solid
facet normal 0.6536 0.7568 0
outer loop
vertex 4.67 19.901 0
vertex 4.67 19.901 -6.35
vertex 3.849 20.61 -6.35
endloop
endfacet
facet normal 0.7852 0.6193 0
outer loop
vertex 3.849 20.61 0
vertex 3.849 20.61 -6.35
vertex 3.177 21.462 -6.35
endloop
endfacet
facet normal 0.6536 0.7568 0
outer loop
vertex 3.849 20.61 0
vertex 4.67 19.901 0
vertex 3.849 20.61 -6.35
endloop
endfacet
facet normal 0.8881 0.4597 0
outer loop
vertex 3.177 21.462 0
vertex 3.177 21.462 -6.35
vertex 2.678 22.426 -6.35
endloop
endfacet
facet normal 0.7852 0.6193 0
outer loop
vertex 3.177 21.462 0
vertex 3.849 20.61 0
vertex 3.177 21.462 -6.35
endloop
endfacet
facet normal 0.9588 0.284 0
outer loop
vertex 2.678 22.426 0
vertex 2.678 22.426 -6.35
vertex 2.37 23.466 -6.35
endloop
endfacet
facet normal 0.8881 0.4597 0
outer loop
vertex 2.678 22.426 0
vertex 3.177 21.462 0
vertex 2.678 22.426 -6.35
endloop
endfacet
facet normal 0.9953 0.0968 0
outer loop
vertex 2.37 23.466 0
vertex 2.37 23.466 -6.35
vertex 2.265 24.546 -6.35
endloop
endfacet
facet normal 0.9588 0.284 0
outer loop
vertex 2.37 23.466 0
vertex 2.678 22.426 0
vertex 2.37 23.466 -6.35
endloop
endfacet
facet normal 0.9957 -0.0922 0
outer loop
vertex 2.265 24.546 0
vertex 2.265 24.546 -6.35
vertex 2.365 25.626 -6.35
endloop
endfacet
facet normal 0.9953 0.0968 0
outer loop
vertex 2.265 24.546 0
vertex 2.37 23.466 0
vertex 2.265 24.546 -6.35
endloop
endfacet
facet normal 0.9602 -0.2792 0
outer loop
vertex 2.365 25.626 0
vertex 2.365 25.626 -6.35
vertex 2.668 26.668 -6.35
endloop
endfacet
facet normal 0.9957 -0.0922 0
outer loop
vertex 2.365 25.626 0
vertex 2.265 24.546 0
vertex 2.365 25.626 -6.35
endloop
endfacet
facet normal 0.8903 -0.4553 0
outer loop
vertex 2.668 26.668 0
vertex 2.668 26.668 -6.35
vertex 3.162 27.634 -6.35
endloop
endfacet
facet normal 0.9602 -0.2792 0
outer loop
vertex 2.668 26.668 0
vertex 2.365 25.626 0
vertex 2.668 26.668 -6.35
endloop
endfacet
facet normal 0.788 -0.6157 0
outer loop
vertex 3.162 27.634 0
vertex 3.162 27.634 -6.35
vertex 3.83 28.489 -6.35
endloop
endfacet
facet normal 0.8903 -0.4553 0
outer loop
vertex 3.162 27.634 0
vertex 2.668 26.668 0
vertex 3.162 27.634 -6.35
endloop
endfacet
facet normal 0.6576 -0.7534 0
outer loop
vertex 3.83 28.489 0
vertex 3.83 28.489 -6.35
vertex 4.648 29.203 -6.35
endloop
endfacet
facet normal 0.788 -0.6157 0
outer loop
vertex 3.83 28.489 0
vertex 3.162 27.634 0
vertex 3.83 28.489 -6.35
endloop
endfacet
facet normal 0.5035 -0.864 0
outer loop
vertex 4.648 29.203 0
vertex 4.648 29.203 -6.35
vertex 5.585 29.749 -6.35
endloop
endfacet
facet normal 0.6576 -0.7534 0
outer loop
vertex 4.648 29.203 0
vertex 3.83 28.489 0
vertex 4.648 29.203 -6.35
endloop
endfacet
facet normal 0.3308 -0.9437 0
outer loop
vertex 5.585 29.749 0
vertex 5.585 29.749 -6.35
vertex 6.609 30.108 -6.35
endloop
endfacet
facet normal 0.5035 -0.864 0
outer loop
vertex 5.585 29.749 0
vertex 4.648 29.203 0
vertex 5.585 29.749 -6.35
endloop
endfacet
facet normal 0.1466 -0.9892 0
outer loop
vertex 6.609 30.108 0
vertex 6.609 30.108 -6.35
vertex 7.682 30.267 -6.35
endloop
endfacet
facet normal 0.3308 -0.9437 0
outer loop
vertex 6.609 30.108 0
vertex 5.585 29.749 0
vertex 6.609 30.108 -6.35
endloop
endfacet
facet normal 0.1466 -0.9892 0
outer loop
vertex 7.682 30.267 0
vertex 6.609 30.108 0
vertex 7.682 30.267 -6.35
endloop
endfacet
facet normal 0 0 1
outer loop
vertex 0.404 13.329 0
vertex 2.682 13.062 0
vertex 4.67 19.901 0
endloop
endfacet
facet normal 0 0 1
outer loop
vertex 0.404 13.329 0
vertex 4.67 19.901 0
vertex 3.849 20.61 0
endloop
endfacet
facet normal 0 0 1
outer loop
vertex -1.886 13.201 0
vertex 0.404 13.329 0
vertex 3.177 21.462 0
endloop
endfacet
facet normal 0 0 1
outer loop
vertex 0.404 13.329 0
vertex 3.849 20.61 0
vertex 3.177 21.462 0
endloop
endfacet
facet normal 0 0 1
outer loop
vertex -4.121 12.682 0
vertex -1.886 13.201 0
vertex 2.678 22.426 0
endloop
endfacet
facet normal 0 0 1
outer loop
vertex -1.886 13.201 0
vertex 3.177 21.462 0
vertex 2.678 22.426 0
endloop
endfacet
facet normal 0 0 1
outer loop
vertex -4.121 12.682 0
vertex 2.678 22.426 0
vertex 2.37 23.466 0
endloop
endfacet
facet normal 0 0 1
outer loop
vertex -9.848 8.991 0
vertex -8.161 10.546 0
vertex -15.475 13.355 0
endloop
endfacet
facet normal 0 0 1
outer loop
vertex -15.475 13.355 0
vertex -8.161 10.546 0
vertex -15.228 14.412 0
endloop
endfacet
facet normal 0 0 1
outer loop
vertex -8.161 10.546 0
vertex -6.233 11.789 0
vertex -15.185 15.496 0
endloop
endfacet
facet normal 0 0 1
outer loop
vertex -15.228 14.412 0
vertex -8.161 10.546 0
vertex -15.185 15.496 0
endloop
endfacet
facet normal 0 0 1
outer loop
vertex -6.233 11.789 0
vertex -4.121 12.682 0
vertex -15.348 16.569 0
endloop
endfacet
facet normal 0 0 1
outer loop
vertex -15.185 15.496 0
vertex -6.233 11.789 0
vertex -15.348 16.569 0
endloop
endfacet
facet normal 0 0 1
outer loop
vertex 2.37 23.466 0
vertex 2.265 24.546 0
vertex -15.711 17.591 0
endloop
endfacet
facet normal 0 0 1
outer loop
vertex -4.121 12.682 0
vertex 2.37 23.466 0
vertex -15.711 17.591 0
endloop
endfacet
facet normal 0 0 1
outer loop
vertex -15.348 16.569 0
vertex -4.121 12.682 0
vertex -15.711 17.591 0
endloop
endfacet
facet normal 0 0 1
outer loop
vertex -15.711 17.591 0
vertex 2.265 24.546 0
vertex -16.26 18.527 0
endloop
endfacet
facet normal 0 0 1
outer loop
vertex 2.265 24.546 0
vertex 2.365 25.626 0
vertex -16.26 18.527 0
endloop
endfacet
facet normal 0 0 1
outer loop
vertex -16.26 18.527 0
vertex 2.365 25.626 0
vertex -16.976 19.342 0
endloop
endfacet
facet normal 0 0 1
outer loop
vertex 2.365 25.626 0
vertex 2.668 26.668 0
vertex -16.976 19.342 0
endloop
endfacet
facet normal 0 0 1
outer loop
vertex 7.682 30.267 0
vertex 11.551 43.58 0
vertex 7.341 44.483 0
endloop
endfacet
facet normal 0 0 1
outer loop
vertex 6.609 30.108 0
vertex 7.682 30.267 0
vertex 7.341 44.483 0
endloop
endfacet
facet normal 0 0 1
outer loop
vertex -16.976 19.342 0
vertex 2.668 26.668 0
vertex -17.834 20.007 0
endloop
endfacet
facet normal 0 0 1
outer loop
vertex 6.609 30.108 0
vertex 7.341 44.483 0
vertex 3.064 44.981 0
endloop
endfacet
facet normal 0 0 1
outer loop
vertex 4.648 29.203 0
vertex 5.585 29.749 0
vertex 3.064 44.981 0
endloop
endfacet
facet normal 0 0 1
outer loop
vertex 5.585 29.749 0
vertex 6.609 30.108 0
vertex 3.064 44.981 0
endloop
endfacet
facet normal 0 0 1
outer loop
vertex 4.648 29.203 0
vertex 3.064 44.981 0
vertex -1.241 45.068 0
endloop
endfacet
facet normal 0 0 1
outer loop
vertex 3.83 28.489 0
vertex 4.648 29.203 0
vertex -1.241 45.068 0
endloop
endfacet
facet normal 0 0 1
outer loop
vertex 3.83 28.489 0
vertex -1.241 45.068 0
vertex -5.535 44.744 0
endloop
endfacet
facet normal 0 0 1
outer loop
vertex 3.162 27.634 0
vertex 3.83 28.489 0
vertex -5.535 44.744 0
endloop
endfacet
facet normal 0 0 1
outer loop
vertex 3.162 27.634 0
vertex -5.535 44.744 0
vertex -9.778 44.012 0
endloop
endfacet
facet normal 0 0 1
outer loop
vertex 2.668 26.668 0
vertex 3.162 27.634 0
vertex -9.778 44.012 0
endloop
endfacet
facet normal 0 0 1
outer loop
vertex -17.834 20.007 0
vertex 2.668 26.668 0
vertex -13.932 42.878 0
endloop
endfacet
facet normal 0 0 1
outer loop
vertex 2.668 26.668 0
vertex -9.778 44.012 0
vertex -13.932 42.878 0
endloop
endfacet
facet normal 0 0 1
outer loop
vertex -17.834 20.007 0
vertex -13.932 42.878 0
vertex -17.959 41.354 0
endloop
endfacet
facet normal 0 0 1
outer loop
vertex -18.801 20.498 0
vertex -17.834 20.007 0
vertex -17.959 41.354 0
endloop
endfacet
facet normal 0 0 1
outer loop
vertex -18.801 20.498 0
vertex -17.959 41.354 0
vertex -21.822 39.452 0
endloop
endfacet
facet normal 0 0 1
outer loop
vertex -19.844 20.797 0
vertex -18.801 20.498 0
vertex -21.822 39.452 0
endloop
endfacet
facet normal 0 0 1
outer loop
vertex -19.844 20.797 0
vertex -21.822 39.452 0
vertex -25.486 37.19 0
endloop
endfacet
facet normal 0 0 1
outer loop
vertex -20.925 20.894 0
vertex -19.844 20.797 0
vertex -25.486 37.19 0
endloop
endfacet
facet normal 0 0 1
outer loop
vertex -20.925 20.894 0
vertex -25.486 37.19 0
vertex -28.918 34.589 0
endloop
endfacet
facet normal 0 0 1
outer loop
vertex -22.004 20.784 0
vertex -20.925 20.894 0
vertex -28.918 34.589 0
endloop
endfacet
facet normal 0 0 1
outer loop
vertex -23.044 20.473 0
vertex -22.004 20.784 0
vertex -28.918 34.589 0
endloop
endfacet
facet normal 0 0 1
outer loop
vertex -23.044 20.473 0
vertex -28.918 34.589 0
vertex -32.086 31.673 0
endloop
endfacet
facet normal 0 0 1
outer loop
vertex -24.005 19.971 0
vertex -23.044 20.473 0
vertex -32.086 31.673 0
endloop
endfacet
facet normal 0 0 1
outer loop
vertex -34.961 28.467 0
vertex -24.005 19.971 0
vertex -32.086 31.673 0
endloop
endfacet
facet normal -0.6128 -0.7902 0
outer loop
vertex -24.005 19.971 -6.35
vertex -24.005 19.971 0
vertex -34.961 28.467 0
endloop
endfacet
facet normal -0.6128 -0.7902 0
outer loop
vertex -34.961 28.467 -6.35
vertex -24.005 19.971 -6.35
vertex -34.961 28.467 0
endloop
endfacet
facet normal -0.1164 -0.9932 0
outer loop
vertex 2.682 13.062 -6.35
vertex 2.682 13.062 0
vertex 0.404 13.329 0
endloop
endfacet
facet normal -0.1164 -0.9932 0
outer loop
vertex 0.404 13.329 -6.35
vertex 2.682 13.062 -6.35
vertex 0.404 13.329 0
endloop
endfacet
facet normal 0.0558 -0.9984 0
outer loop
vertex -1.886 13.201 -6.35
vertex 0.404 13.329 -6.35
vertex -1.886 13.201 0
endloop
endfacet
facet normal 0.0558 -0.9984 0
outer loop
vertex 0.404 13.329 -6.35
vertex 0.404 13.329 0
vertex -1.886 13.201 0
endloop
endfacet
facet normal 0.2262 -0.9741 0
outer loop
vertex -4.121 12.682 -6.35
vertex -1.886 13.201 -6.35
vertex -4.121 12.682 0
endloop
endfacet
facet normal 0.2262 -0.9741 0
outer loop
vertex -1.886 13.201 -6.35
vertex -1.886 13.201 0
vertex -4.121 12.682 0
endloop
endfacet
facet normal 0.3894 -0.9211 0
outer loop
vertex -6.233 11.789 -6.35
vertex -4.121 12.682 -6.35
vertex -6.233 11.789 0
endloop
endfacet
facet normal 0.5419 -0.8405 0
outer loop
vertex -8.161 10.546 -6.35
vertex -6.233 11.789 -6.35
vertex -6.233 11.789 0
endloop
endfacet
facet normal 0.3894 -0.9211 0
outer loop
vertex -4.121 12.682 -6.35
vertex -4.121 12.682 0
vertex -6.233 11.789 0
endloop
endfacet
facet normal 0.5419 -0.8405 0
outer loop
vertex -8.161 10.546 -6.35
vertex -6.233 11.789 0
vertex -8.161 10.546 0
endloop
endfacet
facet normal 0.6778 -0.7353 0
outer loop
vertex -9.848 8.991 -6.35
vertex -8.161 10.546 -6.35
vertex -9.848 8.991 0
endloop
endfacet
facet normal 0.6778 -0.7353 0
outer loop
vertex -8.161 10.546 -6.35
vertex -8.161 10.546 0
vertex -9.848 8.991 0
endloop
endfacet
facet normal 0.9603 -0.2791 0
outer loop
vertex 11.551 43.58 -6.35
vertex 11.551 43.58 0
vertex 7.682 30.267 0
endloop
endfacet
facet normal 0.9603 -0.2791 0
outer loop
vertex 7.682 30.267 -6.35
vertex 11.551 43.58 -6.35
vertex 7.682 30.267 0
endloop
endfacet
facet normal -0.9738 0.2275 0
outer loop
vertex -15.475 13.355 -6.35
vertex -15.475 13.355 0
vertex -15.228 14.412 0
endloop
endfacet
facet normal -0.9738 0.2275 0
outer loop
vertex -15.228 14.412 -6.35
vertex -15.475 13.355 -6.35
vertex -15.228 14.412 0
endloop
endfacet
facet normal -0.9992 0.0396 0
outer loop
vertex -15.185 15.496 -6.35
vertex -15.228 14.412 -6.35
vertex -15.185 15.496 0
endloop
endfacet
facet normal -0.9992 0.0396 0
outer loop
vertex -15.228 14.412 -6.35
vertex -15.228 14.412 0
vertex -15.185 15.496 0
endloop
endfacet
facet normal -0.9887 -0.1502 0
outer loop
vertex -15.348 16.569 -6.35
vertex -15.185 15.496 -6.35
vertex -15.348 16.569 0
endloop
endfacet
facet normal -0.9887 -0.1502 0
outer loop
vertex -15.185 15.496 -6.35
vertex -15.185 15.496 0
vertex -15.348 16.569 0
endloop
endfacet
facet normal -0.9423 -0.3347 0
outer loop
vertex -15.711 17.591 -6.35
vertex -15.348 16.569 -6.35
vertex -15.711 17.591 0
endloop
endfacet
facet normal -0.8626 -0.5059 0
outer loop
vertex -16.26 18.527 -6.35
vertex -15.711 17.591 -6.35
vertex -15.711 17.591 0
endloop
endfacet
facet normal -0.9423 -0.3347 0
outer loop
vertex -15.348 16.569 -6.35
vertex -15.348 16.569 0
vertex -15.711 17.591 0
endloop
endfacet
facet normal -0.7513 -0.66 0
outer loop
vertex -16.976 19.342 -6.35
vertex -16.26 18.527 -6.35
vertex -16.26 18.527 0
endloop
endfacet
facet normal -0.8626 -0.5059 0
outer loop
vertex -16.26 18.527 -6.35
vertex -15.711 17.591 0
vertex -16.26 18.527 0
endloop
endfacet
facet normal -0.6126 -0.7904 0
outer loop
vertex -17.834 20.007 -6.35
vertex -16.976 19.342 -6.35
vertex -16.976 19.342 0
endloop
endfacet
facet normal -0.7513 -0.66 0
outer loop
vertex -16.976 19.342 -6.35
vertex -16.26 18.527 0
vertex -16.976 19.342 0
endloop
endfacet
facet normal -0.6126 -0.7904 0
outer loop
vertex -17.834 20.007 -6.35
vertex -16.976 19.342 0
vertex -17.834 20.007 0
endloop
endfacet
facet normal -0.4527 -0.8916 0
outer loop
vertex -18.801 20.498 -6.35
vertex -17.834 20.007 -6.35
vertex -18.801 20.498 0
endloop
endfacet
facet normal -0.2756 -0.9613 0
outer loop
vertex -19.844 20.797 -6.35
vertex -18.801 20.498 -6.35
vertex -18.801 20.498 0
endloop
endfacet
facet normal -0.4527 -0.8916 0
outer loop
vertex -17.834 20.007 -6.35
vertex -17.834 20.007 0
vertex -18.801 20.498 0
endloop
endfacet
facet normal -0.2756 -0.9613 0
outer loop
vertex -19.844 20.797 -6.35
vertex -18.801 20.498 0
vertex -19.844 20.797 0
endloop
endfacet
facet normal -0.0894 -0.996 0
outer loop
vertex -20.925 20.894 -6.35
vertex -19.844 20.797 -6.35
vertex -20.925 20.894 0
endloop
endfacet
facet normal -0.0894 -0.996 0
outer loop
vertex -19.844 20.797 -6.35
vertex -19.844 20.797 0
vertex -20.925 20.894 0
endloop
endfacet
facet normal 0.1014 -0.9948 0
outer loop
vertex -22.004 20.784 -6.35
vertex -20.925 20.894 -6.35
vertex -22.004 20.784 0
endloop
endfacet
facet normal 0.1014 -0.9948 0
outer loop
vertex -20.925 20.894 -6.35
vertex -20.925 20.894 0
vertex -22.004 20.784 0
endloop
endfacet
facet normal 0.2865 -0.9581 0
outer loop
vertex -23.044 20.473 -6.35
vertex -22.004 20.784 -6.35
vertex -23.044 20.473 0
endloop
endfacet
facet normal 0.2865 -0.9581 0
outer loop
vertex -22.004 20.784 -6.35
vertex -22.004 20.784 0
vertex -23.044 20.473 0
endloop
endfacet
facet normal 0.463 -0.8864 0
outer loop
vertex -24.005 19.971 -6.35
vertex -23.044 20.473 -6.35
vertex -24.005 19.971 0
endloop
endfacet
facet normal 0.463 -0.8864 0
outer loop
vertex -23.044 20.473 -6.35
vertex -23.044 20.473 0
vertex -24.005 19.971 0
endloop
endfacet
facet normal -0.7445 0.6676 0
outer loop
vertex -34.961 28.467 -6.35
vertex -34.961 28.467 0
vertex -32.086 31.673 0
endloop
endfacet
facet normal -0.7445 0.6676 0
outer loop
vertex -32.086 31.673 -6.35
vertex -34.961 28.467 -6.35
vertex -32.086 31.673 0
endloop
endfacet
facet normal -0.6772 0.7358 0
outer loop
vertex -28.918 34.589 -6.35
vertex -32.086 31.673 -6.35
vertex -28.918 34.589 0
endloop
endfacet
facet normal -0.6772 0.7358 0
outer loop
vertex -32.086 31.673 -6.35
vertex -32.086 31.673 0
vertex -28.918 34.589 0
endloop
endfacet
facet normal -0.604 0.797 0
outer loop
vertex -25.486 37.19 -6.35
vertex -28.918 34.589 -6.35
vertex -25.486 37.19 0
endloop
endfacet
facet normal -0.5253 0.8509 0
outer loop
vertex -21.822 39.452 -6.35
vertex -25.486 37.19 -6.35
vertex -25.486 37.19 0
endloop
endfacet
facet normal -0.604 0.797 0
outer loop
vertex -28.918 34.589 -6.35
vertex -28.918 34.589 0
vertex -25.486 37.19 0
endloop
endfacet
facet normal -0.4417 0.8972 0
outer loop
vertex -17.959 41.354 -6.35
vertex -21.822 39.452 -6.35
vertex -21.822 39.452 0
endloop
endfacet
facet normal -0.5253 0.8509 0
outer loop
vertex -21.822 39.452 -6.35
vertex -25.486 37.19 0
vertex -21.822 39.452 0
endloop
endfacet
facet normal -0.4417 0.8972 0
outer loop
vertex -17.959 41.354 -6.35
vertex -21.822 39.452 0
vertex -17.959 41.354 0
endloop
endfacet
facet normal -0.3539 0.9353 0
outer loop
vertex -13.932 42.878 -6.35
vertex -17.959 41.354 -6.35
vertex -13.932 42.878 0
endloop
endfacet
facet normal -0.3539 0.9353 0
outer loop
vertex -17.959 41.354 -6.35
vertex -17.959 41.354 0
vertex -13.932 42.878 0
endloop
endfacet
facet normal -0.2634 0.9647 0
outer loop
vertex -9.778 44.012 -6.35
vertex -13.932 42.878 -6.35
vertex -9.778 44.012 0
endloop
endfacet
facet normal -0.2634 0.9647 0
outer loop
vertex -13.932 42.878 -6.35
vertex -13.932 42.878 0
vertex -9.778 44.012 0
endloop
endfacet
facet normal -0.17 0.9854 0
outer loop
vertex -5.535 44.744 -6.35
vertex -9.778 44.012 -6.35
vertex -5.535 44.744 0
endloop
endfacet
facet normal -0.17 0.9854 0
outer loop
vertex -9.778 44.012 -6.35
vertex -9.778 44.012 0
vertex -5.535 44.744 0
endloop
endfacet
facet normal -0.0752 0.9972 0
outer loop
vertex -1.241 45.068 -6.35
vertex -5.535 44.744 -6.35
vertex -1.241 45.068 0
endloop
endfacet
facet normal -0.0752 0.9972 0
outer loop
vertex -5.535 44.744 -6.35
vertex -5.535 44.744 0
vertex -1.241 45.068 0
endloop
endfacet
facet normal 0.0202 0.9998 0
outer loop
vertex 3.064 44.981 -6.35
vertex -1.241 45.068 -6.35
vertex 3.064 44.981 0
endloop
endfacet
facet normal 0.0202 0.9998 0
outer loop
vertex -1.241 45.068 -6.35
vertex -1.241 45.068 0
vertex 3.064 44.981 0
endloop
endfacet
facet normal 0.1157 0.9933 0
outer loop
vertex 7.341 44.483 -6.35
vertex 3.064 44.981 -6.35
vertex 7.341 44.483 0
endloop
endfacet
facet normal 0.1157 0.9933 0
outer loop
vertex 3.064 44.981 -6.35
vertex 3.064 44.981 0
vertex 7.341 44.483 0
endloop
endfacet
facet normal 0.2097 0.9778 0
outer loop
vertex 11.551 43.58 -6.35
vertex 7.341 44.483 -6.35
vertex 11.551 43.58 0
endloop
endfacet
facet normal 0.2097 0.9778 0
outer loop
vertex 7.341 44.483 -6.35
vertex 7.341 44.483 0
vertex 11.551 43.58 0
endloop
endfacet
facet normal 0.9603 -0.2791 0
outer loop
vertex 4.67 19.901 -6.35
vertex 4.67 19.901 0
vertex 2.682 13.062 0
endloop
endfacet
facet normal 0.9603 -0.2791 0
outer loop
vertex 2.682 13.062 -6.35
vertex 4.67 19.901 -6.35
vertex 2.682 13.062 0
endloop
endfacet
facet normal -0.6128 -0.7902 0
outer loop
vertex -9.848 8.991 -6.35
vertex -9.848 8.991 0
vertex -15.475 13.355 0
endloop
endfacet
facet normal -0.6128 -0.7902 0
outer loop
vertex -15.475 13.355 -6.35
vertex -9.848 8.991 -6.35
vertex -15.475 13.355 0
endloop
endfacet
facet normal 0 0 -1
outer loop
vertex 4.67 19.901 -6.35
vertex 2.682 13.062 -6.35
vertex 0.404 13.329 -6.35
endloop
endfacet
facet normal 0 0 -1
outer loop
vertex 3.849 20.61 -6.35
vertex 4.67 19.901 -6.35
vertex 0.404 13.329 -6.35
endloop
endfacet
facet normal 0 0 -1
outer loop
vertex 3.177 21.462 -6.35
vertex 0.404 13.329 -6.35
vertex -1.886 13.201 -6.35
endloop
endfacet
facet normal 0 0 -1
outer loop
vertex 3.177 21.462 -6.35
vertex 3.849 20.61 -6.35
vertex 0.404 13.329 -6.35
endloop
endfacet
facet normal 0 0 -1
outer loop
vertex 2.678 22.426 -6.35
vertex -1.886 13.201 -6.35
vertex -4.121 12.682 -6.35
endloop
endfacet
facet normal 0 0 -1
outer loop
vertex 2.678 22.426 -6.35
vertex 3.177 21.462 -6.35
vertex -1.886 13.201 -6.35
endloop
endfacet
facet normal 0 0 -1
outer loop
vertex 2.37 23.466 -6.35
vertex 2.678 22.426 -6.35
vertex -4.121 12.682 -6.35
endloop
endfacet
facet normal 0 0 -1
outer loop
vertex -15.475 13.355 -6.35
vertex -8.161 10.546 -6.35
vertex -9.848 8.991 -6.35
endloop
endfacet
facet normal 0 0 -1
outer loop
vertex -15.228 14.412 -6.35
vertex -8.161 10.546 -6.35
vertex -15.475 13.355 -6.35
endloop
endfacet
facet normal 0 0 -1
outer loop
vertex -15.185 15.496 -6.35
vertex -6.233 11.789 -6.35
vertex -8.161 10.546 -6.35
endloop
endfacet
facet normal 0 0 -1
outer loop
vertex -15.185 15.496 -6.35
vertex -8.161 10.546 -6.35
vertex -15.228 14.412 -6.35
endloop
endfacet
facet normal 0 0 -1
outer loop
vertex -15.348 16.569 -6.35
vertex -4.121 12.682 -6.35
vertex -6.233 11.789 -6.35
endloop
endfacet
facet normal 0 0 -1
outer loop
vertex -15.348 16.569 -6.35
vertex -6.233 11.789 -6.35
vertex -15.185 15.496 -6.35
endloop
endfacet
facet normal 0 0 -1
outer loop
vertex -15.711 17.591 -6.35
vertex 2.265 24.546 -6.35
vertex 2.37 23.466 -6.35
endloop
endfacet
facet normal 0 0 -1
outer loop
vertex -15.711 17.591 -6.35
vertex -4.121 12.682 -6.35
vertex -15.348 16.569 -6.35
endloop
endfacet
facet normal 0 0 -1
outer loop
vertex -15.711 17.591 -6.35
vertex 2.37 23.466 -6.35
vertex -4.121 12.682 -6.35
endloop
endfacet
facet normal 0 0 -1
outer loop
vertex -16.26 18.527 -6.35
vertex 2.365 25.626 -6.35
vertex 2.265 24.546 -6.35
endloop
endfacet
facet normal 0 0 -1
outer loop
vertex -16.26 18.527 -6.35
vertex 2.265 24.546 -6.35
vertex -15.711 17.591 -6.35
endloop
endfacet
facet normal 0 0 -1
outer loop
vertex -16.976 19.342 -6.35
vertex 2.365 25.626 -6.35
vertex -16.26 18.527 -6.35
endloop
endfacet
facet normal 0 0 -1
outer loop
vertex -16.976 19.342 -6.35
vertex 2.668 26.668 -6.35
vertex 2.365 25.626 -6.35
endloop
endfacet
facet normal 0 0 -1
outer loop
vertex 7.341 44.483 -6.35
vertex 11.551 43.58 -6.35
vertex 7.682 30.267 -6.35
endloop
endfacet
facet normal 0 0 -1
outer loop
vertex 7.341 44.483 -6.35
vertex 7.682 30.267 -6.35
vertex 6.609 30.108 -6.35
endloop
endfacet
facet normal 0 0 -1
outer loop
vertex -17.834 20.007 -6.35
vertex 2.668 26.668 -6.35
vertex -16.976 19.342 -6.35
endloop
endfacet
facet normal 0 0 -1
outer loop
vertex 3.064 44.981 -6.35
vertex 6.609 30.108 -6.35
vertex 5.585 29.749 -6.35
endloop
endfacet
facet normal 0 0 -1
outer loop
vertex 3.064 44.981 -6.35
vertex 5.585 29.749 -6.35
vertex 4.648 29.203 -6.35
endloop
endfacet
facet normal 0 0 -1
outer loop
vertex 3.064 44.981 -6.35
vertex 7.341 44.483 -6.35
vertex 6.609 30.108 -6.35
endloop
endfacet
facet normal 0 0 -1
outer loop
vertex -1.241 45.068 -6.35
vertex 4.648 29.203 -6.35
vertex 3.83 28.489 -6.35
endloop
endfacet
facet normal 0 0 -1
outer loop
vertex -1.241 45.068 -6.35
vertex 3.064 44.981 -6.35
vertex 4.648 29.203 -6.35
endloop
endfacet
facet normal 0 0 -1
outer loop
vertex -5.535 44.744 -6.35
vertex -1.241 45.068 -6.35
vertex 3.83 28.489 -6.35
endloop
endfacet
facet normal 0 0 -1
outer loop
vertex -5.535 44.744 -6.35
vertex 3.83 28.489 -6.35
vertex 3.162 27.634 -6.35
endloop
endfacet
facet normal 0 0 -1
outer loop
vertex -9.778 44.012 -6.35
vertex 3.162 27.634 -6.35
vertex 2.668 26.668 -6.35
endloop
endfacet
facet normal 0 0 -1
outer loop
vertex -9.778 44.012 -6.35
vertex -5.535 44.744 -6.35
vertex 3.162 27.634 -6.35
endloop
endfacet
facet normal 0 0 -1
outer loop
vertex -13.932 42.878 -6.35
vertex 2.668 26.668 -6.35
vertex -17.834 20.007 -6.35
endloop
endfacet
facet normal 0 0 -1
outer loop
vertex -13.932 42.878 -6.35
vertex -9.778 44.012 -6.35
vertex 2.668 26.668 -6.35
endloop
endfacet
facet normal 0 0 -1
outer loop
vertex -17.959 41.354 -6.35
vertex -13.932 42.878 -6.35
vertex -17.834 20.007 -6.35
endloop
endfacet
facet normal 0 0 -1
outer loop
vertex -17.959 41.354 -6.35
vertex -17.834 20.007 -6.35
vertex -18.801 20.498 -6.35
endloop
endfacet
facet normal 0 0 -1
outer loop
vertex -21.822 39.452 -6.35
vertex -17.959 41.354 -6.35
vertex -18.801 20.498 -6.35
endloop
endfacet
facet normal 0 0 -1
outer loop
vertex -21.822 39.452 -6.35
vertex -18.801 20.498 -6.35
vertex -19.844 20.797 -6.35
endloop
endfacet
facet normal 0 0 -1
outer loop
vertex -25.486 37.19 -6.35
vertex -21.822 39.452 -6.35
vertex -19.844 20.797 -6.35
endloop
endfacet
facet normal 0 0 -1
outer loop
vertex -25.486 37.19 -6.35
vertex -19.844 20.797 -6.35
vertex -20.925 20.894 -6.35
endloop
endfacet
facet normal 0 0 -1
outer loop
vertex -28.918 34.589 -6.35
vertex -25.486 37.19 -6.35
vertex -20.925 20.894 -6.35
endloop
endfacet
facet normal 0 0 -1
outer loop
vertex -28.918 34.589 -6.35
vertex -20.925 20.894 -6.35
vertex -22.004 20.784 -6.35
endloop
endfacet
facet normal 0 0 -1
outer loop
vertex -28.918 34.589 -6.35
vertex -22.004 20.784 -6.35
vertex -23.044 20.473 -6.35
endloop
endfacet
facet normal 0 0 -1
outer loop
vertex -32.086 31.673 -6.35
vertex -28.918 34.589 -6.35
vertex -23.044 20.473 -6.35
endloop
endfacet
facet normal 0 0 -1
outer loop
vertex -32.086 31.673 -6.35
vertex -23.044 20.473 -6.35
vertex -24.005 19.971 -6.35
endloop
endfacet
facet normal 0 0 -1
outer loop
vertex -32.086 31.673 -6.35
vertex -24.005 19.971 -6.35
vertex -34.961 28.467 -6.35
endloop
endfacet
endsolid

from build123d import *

# Parameters (mm, degrees)
BOSS_EXTRUDE1_DEPTH = 6.35
CUT_EXTRUDE1_DEPTH  = 58.404294318


with BuildPart() as part:
    # Sketch13 → Boss-Extrude1 (new body)
    with BuildSketch(Plane.XY):
        with BuildLine():
            Line((11.551437691, 43.580058654), (2.682196049, 13.0624672))
            ThreePointArc((2.682196049, 13.0624672), (-4.12074162, 12.682338645), (-9.847867764, 8.991202672))
            Line((-9.847867764, 8.991202672), (-34.961025172, 28.467243349))
            ThreePointArc((-34.961025172, 28.467243349), (-13.932031191, 42.878383037), (11.551437691, 43.580058654))
        make_face()
    extrude(amount=-BOSS_EXTRUDE1_DEPTH)

    # Sketch15 → Cut-Extrude1 (cut, through all)
    with BuildSketch(Plane.XY):
        with BuildLine():
            Line((7.682261651, 30.266864763), (4.669640038, 19.900932781))
            ThreePointArc((4.669640038, 19.900932781), (2.491973647, 26.154562688), (7.682261651, 30.266864763))
        make_face()
        with BuildLine():
            Line((-24.005496972, 19.970887857), (-15.475292944, 13.355447276))
            ThreePointArc((-15.475292944, 13.355447276), (-17.389315258, 19.694740336), (-24.005496972, 19.970887857))
        make_face()
    extrude(amount=-CUT_EXTRUDE1_DEPTH, mode=Mode.SUBTRACT)


solid = part.part
